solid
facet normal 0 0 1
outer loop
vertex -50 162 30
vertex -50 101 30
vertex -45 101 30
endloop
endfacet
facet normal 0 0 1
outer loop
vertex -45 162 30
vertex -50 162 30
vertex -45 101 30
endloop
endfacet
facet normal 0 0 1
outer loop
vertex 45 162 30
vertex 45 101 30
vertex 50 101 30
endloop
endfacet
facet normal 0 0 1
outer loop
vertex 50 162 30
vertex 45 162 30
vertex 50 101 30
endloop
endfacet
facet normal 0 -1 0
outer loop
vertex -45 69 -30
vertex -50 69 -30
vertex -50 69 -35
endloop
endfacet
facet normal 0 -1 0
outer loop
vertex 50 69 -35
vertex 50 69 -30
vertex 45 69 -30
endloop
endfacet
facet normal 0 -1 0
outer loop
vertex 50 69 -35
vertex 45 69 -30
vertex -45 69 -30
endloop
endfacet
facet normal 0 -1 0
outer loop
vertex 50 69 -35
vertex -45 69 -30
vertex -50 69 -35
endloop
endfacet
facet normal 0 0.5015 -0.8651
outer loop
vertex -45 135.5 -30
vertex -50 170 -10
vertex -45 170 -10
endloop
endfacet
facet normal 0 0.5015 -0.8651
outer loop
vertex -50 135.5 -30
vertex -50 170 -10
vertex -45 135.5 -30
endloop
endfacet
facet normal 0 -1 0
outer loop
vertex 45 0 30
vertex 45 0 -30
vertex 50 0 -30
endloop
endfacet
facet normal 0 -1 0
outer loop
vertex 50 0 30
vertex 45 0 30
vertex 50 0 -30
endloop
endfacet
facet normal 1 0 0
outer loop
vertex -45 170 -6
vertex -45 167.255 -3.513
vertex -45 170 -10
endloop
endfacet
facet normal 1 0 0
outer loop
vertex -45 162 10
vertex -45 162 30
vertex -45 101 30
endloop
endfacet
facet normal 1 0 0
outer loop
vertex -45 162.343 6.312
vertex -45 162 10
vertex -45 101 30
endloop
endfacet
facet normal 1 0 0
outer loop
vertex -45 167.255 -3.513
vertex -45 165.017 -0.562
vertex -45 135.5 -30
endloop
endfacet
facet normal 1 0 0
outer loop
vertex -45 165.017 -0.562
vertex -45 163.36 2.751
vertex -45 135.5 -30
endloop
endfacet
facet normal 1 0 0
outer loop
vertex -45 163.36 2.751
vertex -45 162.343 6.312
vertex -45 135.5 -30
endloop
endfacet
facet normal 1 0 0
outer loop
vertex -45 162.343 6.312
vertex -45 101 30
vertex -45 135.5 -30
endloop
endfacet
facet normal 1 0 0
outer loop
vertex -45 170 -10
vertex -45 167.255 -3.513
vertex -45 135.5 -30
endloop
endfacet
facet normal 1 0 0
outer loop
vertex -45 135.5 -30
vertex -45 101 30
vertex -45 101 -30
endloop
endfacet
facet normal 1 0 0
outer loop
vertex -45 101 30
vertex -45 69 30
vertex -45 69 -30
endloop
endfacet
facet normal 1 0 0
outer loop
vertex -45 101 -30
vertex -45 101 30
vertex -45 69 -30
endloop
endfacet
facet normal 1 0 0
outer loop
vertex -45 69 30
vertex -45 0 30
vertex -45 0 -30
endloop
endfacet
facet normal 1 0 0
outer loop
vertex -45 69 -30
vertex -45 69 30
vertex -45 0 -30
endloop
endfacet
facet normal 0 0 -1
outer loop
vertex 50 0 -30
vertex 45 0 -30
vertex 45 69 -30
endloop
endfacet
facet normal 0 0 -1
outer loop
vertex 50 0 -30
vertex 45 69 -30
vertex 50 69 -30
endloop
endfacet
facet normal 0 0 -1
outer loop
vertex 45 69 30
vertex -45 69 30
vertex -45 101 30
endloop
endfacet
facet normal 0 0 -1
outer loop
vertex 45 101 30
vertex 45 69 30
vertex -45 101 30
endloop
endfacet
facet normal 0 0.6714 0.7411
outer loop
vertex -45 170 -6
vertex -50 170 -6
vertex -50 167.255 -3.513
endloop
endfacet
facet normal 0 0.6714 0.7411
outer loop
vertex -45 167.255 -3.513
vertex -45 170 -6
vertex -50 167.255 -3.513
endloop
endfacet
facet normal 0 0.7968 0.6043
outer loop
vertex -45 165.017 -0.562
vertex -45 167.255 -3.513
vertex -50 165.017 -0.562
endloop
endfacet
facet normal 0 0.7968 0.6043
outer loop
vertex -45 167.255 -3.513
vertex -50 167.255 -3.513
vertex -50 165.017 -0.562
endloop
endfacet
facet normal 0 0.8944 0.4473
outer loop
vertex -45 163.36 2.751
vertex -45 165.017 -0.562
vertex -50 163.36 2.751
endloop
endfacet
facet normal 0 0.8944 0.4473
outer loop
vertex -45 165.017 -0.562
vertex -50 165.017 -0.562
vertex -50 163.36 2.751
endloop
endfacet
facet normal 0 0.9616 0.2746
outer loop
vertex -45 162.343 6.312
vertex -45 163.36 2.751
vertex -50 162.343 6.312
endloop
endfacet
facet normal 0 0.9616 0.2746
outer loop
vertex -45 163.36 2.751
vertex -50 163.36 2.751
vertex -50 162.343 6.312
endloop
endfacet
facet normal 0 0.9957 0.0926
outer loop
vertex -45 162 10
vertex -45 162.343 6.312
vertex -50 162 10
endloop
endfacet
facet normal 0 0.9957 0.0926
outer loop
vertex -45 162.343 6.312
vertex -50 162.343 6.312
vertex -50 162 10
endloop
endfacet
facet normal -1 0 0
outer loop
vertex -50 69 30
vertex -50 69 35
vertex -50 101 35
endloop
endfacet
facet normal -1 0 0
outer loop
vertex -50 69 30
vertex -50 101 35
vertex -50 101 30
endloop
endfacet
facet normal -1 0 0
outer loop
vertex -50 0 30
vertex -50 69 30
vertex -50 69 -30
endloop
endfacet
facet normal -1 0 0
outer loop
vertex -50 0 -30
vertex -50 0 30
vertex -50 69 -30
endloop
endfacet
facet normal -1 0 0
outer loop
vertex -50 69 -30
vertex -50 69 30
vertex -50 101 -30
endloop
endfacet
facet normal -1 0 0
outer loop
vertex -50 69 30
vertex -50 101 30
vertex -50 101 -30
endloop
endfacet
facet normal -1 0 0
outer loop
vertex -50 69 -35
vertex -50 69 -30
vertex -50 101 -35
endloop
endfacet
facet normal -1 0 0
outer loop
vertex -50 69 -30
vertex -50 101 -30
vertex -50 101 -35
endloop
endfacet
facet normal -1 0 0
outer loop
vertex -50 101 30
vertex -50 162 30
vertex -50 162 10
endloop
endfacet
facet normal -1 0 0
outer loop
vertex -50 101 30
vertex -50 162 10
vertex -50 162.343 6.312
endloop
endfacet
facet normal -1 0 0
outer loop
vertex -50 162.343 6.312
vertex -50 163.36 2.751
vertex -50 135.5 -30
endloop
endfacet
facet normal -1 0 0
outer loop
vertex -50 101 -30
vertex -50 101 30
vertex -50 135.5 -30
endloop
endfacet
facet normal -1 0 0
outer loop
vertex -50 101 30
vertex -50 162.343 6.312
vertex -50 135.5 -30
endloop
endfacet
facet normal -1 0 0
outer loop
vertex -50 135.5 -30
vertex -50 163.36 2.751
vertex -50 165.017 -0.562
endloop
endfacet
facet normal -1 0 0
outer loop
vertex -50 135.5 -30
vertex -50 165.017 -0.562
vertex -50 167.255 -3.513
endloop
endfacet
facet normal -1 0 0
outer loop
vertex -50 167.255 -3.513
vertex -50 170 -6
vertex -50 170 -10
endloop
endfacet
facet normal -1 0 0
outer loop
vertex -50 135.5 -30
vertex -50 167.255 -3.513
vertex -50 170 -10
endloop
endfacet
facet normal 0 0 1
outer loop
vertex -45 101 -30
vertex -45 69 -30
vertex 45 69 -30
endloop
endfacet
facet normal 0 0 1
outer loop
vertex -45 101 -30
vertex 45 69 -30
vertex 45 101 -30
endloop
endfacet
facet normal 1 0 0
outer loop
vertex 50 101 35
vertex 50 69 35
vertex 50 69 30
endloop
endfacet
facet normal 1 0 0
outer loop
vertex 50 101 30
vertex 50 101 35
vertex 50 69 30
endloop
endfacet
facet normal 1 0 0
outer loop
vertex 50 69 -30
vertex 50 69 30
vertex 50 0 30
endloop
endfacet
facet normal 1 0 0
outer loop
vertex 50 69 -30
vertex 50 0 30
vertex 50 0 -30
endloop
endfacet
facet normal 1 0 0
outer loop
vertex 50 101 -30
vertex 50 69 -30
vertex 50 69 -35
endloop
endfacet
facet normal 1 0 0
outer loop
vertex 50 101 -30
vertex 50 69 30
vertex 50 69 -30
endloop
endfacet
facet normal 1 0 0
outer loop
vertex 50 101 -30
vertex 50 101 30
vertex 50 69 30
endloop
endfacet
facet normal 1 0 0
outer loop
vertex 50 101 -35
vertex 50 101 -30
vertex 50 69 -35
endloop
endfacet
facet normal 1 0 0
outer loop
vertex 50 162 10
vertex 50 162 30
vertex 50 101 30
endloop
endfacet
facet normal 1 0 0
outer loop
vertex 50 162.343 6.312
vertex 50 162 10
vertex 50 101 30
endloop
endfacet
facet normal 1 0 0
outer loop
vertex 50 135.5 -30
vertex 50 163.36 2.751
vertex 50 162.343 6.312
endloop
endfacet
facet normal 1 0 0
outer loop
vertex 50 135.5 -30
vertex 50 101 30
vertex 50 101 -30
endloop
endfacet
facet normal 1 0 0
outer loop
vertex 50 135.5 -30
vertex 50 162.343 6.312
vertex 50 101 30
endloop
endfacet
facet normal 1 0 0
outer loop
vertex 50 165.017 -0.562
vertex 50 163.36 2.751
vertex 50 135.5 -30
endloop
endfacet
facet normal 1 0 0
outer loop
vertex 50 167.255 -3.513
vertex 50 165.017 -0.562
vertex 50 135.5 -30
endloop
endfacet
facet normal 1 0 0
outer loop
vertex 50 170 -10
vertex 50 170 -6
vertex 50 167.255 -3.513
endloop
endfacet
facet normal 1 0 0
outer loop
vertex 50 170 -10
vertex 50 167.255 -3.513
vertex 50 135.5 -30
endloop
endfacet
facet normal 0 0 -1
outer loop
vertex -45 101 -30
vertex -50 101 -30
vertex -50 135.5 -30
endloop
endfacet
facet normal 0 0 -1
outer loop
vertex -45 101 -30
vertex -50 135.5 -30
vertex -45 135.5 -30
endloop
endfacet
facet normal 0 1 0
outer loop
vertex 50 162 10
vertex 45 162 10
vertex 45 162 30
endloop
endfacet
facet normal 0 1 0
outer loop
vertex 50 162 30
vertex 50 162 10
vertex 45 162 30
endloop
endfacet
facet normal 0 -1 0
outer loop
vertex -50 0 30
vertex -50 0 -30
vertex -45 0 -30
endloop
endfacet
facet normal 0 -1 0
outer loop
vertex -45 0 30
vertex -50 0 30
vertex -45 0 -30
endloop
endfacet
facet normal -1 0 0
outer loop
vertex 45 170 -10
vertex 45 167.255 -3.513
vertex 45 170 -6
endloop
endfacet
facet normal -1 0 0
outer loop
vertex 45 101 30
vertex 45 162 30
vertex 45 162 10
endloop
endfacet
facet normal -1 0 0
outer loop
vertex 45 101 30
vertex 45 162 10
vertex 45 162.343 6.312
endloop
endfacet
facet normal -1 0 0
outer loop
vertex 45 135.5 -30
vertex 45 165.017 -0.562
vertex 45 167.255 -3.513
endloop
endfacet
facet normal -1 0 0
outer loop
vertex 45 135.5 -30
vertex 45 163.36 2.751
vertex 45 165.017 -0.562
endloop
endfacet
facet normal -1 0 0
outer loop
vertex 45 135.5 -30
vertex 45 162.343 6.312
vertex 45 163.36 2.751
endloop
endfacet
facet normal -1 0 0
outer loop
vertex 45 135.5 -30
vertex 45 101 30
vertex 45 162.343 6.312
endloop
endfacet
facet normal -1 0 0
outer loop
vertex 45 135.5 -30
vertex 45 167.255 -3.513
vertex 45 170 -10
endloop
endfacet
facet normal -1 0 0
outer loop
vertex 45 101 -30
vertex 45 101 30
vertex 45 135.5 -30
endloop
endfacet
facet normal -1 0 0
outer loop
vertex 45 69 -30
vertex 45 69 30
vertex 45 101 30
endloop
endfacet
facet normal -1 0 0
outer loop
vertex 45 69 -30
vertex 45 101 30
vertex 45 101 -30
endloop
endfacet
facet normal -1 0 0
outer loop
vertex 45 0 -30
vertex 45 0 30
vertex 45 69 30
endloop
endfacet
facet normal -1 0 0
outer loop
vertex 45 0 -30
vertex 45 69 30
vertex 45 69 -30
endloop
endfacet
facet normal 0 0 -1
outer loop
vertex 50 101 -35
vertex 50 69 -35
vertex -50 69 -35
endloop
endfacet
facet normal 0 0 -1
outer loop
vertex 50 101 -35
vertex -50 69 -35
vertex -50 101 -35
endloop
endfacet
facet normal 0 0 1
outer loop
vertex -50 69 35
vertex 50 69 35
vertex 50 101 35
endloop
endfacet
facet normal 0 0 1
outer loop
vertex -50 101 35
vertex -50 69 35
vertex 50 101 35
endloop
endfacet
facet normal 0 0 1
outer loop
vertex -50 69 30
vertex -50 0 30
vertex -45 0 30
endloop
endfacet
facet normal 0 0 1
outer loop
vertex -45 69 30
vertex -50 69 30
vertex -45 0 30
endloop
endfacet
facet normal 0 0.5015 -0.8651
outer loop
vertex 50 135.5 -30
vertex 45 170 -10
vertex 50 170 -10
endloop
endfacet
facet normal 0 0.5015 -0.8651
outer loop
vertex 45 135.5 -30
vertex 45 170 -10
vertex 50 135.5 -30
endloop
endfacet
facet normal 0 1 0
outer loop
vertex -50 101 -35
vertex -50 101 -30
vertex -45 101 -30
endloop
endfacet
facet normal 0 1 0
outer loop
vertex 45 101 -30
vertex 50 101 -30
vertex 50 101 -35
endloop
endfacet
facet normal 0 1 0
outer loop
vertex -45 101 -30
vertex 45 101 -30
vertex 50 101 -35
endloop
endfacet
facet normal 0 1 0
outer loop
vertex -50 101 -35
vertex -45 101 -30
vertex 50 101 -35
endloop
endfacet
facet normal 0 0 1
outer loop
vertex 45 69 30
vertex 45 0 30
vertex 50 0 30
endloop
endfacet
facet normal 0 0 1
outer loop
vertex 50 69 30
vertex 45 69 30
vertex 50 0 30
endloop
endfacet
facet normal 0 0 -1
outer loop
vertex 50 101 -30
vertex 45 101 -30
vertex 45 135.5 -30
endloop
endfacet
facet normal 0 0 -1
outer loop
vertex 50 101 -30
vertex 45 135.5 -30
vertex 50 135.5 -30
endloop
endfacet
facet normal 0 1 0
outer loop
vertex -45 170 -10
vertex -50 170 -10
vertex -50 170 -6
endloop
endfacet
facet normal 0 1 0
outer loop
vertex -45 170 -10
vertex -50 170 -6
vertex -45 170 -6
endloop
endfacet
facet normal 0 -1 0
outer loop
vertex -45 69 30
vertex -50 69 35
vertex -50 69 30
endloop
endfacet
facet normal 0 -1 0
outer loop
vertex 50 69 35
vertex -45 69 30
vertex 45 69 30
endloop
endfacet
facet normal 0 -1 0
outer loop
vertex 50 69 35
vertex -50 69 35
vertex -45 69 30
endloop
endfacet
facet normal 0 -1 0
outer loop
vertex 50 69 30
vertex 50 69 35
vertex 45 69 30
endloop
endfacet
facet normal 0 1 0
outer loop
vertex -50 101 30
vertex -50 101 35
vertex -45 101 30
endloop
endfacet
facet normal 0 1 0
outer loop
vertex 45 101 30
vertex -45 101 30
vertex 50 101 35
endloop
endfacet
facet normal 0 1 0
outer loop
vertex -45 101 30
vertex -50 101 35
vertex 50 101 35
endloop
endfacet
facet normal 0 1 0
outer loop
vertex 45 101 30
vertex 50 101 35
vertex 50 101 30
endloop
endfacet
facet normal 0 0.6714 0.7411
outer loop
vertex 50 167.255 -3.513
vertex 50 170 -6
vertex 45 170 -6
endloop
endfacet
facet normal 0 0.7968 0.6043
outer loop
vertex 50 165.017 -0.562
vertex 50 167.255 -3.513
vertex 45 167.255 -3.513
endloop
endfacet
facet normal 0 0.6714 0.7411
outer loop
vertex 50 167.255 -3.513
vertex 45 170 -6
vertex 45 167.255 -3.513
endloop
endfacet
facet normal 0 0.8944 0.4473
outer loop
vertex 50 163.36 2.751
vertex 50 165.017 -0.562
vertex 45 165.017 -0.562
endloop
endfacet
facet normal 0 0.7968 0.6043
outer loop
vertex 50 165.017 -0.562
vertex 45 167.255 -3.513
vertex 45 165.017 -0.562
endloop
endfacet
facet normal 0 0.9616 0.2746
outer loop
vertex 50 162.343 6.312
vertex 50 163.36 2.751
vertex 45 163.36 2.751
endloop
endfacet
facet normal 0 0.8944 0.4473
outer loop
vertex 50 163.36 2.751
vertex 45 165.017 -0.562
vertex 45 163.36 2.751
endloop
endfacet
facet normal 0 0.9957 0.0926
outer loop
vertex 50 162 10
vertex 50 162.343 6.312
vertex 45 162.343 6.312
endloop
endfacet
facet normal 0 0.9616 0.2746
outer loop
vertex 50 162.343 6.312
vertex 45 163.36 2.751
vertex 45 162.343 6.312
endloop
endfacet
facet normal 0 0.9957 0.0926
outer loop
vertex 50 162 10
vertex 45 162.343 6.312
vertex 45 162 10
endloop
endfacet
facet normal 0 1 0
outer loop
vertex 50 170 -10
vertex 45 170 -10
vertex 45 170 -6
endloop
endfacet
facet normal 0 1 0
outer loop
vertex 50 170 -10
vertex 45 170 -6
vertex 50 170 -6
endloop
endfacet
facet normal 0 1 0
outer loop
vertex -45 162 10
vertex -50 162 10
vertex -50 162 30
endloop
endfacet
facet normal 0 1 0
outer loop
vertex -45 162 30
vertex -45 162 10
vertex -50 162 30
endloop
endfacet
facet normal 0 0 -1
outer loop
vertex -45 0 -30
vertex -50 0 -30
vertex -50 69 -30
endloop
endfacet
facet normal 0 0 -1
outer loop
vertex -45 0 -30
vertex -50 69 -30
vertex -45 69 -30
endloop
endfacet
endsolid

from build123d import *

# Parameters (mm, degrees)
SKETCH_1_W          = 5
SKETCH_1_H          = 60
EXTRUDE_1_DEPTH     = 170
EXTRUDE_1_2_DEPTH   = 170
SKETCH_2_W          = 5
SKETCH_2_H          = 32
EXTRUDE_2_DEPTH     = 100
CUT_EXTRUDE_2_DEPTH = 120


with BuildPart() as part:
    # 草图1 → 凸台-拉伸1 (new body)
    with BuildSketch(Plane(origin=(0, 0, 0), x_dir=(1, 0, 0), z_dir=(0, 1, 0))):
        with Locations((-47.5, 0)):
            Rectangle(SKETCH_1_W, SKETCH_1_H)
    extrude(amount=EXTRUDE_1_DEPTH)



with BuildPart() as body_2:
    # 草图1 → Extrude 1 2 (new body)
    with BuildSketch(Plane(origin=(0, 0, 0), x_dir=(1, 0, 0), z_dir=(0, 1, 0))):
        with Locations((47.5, 0)):
            Rectangle(SKETCH_1_W, SKETCH_1_H)
    extrude(amount=EXTRUDE_1_2_DEPTH)


with BuildPart() as part_1:
    add(part.part)

    add(body_2.part)  # 凸台-拉伸2 merges body 2
    # 草图2 → 凸台-拉伸2 (add)
    with BuildSketch(Plane(origin=(50, 0, 0), x_dir=(0, 0, -1), z_dir=(1, 0, 0))):
        with Locations((-32.5, 85)):
            Rectangle(SKETCH_2_W, SKETCH_2_H)
        with Locations((32.5, 85)):
            Rectangle(SKETCH_2_W, SKETCH_2_H)
    extrude(amount=-EXTRUDE_2_DEPTH)

    # 草图3 → 切除-拉伸2 (cut)
    with BuildSketch(Plane.ZY.offset(50)):
        Polygon((-10, 170), (-30, 135.5), (-48.568866089, 135.5), (-48.568866089, 174.591079236), (-10, 174.591079236), align=None)
        with BuildLine():
            Line((10, 162), (30, 162))
            Line((30, 162), (30, 182))
            ThreePointArc((30, 182), (-4.142135624, 196.142135624), (10, 162))
        make_face()
    extrude(amount=-CUT_EXTRUDE_2_DEPTH, mode=Mode.SUBTRACT)


solid = part_1.part
